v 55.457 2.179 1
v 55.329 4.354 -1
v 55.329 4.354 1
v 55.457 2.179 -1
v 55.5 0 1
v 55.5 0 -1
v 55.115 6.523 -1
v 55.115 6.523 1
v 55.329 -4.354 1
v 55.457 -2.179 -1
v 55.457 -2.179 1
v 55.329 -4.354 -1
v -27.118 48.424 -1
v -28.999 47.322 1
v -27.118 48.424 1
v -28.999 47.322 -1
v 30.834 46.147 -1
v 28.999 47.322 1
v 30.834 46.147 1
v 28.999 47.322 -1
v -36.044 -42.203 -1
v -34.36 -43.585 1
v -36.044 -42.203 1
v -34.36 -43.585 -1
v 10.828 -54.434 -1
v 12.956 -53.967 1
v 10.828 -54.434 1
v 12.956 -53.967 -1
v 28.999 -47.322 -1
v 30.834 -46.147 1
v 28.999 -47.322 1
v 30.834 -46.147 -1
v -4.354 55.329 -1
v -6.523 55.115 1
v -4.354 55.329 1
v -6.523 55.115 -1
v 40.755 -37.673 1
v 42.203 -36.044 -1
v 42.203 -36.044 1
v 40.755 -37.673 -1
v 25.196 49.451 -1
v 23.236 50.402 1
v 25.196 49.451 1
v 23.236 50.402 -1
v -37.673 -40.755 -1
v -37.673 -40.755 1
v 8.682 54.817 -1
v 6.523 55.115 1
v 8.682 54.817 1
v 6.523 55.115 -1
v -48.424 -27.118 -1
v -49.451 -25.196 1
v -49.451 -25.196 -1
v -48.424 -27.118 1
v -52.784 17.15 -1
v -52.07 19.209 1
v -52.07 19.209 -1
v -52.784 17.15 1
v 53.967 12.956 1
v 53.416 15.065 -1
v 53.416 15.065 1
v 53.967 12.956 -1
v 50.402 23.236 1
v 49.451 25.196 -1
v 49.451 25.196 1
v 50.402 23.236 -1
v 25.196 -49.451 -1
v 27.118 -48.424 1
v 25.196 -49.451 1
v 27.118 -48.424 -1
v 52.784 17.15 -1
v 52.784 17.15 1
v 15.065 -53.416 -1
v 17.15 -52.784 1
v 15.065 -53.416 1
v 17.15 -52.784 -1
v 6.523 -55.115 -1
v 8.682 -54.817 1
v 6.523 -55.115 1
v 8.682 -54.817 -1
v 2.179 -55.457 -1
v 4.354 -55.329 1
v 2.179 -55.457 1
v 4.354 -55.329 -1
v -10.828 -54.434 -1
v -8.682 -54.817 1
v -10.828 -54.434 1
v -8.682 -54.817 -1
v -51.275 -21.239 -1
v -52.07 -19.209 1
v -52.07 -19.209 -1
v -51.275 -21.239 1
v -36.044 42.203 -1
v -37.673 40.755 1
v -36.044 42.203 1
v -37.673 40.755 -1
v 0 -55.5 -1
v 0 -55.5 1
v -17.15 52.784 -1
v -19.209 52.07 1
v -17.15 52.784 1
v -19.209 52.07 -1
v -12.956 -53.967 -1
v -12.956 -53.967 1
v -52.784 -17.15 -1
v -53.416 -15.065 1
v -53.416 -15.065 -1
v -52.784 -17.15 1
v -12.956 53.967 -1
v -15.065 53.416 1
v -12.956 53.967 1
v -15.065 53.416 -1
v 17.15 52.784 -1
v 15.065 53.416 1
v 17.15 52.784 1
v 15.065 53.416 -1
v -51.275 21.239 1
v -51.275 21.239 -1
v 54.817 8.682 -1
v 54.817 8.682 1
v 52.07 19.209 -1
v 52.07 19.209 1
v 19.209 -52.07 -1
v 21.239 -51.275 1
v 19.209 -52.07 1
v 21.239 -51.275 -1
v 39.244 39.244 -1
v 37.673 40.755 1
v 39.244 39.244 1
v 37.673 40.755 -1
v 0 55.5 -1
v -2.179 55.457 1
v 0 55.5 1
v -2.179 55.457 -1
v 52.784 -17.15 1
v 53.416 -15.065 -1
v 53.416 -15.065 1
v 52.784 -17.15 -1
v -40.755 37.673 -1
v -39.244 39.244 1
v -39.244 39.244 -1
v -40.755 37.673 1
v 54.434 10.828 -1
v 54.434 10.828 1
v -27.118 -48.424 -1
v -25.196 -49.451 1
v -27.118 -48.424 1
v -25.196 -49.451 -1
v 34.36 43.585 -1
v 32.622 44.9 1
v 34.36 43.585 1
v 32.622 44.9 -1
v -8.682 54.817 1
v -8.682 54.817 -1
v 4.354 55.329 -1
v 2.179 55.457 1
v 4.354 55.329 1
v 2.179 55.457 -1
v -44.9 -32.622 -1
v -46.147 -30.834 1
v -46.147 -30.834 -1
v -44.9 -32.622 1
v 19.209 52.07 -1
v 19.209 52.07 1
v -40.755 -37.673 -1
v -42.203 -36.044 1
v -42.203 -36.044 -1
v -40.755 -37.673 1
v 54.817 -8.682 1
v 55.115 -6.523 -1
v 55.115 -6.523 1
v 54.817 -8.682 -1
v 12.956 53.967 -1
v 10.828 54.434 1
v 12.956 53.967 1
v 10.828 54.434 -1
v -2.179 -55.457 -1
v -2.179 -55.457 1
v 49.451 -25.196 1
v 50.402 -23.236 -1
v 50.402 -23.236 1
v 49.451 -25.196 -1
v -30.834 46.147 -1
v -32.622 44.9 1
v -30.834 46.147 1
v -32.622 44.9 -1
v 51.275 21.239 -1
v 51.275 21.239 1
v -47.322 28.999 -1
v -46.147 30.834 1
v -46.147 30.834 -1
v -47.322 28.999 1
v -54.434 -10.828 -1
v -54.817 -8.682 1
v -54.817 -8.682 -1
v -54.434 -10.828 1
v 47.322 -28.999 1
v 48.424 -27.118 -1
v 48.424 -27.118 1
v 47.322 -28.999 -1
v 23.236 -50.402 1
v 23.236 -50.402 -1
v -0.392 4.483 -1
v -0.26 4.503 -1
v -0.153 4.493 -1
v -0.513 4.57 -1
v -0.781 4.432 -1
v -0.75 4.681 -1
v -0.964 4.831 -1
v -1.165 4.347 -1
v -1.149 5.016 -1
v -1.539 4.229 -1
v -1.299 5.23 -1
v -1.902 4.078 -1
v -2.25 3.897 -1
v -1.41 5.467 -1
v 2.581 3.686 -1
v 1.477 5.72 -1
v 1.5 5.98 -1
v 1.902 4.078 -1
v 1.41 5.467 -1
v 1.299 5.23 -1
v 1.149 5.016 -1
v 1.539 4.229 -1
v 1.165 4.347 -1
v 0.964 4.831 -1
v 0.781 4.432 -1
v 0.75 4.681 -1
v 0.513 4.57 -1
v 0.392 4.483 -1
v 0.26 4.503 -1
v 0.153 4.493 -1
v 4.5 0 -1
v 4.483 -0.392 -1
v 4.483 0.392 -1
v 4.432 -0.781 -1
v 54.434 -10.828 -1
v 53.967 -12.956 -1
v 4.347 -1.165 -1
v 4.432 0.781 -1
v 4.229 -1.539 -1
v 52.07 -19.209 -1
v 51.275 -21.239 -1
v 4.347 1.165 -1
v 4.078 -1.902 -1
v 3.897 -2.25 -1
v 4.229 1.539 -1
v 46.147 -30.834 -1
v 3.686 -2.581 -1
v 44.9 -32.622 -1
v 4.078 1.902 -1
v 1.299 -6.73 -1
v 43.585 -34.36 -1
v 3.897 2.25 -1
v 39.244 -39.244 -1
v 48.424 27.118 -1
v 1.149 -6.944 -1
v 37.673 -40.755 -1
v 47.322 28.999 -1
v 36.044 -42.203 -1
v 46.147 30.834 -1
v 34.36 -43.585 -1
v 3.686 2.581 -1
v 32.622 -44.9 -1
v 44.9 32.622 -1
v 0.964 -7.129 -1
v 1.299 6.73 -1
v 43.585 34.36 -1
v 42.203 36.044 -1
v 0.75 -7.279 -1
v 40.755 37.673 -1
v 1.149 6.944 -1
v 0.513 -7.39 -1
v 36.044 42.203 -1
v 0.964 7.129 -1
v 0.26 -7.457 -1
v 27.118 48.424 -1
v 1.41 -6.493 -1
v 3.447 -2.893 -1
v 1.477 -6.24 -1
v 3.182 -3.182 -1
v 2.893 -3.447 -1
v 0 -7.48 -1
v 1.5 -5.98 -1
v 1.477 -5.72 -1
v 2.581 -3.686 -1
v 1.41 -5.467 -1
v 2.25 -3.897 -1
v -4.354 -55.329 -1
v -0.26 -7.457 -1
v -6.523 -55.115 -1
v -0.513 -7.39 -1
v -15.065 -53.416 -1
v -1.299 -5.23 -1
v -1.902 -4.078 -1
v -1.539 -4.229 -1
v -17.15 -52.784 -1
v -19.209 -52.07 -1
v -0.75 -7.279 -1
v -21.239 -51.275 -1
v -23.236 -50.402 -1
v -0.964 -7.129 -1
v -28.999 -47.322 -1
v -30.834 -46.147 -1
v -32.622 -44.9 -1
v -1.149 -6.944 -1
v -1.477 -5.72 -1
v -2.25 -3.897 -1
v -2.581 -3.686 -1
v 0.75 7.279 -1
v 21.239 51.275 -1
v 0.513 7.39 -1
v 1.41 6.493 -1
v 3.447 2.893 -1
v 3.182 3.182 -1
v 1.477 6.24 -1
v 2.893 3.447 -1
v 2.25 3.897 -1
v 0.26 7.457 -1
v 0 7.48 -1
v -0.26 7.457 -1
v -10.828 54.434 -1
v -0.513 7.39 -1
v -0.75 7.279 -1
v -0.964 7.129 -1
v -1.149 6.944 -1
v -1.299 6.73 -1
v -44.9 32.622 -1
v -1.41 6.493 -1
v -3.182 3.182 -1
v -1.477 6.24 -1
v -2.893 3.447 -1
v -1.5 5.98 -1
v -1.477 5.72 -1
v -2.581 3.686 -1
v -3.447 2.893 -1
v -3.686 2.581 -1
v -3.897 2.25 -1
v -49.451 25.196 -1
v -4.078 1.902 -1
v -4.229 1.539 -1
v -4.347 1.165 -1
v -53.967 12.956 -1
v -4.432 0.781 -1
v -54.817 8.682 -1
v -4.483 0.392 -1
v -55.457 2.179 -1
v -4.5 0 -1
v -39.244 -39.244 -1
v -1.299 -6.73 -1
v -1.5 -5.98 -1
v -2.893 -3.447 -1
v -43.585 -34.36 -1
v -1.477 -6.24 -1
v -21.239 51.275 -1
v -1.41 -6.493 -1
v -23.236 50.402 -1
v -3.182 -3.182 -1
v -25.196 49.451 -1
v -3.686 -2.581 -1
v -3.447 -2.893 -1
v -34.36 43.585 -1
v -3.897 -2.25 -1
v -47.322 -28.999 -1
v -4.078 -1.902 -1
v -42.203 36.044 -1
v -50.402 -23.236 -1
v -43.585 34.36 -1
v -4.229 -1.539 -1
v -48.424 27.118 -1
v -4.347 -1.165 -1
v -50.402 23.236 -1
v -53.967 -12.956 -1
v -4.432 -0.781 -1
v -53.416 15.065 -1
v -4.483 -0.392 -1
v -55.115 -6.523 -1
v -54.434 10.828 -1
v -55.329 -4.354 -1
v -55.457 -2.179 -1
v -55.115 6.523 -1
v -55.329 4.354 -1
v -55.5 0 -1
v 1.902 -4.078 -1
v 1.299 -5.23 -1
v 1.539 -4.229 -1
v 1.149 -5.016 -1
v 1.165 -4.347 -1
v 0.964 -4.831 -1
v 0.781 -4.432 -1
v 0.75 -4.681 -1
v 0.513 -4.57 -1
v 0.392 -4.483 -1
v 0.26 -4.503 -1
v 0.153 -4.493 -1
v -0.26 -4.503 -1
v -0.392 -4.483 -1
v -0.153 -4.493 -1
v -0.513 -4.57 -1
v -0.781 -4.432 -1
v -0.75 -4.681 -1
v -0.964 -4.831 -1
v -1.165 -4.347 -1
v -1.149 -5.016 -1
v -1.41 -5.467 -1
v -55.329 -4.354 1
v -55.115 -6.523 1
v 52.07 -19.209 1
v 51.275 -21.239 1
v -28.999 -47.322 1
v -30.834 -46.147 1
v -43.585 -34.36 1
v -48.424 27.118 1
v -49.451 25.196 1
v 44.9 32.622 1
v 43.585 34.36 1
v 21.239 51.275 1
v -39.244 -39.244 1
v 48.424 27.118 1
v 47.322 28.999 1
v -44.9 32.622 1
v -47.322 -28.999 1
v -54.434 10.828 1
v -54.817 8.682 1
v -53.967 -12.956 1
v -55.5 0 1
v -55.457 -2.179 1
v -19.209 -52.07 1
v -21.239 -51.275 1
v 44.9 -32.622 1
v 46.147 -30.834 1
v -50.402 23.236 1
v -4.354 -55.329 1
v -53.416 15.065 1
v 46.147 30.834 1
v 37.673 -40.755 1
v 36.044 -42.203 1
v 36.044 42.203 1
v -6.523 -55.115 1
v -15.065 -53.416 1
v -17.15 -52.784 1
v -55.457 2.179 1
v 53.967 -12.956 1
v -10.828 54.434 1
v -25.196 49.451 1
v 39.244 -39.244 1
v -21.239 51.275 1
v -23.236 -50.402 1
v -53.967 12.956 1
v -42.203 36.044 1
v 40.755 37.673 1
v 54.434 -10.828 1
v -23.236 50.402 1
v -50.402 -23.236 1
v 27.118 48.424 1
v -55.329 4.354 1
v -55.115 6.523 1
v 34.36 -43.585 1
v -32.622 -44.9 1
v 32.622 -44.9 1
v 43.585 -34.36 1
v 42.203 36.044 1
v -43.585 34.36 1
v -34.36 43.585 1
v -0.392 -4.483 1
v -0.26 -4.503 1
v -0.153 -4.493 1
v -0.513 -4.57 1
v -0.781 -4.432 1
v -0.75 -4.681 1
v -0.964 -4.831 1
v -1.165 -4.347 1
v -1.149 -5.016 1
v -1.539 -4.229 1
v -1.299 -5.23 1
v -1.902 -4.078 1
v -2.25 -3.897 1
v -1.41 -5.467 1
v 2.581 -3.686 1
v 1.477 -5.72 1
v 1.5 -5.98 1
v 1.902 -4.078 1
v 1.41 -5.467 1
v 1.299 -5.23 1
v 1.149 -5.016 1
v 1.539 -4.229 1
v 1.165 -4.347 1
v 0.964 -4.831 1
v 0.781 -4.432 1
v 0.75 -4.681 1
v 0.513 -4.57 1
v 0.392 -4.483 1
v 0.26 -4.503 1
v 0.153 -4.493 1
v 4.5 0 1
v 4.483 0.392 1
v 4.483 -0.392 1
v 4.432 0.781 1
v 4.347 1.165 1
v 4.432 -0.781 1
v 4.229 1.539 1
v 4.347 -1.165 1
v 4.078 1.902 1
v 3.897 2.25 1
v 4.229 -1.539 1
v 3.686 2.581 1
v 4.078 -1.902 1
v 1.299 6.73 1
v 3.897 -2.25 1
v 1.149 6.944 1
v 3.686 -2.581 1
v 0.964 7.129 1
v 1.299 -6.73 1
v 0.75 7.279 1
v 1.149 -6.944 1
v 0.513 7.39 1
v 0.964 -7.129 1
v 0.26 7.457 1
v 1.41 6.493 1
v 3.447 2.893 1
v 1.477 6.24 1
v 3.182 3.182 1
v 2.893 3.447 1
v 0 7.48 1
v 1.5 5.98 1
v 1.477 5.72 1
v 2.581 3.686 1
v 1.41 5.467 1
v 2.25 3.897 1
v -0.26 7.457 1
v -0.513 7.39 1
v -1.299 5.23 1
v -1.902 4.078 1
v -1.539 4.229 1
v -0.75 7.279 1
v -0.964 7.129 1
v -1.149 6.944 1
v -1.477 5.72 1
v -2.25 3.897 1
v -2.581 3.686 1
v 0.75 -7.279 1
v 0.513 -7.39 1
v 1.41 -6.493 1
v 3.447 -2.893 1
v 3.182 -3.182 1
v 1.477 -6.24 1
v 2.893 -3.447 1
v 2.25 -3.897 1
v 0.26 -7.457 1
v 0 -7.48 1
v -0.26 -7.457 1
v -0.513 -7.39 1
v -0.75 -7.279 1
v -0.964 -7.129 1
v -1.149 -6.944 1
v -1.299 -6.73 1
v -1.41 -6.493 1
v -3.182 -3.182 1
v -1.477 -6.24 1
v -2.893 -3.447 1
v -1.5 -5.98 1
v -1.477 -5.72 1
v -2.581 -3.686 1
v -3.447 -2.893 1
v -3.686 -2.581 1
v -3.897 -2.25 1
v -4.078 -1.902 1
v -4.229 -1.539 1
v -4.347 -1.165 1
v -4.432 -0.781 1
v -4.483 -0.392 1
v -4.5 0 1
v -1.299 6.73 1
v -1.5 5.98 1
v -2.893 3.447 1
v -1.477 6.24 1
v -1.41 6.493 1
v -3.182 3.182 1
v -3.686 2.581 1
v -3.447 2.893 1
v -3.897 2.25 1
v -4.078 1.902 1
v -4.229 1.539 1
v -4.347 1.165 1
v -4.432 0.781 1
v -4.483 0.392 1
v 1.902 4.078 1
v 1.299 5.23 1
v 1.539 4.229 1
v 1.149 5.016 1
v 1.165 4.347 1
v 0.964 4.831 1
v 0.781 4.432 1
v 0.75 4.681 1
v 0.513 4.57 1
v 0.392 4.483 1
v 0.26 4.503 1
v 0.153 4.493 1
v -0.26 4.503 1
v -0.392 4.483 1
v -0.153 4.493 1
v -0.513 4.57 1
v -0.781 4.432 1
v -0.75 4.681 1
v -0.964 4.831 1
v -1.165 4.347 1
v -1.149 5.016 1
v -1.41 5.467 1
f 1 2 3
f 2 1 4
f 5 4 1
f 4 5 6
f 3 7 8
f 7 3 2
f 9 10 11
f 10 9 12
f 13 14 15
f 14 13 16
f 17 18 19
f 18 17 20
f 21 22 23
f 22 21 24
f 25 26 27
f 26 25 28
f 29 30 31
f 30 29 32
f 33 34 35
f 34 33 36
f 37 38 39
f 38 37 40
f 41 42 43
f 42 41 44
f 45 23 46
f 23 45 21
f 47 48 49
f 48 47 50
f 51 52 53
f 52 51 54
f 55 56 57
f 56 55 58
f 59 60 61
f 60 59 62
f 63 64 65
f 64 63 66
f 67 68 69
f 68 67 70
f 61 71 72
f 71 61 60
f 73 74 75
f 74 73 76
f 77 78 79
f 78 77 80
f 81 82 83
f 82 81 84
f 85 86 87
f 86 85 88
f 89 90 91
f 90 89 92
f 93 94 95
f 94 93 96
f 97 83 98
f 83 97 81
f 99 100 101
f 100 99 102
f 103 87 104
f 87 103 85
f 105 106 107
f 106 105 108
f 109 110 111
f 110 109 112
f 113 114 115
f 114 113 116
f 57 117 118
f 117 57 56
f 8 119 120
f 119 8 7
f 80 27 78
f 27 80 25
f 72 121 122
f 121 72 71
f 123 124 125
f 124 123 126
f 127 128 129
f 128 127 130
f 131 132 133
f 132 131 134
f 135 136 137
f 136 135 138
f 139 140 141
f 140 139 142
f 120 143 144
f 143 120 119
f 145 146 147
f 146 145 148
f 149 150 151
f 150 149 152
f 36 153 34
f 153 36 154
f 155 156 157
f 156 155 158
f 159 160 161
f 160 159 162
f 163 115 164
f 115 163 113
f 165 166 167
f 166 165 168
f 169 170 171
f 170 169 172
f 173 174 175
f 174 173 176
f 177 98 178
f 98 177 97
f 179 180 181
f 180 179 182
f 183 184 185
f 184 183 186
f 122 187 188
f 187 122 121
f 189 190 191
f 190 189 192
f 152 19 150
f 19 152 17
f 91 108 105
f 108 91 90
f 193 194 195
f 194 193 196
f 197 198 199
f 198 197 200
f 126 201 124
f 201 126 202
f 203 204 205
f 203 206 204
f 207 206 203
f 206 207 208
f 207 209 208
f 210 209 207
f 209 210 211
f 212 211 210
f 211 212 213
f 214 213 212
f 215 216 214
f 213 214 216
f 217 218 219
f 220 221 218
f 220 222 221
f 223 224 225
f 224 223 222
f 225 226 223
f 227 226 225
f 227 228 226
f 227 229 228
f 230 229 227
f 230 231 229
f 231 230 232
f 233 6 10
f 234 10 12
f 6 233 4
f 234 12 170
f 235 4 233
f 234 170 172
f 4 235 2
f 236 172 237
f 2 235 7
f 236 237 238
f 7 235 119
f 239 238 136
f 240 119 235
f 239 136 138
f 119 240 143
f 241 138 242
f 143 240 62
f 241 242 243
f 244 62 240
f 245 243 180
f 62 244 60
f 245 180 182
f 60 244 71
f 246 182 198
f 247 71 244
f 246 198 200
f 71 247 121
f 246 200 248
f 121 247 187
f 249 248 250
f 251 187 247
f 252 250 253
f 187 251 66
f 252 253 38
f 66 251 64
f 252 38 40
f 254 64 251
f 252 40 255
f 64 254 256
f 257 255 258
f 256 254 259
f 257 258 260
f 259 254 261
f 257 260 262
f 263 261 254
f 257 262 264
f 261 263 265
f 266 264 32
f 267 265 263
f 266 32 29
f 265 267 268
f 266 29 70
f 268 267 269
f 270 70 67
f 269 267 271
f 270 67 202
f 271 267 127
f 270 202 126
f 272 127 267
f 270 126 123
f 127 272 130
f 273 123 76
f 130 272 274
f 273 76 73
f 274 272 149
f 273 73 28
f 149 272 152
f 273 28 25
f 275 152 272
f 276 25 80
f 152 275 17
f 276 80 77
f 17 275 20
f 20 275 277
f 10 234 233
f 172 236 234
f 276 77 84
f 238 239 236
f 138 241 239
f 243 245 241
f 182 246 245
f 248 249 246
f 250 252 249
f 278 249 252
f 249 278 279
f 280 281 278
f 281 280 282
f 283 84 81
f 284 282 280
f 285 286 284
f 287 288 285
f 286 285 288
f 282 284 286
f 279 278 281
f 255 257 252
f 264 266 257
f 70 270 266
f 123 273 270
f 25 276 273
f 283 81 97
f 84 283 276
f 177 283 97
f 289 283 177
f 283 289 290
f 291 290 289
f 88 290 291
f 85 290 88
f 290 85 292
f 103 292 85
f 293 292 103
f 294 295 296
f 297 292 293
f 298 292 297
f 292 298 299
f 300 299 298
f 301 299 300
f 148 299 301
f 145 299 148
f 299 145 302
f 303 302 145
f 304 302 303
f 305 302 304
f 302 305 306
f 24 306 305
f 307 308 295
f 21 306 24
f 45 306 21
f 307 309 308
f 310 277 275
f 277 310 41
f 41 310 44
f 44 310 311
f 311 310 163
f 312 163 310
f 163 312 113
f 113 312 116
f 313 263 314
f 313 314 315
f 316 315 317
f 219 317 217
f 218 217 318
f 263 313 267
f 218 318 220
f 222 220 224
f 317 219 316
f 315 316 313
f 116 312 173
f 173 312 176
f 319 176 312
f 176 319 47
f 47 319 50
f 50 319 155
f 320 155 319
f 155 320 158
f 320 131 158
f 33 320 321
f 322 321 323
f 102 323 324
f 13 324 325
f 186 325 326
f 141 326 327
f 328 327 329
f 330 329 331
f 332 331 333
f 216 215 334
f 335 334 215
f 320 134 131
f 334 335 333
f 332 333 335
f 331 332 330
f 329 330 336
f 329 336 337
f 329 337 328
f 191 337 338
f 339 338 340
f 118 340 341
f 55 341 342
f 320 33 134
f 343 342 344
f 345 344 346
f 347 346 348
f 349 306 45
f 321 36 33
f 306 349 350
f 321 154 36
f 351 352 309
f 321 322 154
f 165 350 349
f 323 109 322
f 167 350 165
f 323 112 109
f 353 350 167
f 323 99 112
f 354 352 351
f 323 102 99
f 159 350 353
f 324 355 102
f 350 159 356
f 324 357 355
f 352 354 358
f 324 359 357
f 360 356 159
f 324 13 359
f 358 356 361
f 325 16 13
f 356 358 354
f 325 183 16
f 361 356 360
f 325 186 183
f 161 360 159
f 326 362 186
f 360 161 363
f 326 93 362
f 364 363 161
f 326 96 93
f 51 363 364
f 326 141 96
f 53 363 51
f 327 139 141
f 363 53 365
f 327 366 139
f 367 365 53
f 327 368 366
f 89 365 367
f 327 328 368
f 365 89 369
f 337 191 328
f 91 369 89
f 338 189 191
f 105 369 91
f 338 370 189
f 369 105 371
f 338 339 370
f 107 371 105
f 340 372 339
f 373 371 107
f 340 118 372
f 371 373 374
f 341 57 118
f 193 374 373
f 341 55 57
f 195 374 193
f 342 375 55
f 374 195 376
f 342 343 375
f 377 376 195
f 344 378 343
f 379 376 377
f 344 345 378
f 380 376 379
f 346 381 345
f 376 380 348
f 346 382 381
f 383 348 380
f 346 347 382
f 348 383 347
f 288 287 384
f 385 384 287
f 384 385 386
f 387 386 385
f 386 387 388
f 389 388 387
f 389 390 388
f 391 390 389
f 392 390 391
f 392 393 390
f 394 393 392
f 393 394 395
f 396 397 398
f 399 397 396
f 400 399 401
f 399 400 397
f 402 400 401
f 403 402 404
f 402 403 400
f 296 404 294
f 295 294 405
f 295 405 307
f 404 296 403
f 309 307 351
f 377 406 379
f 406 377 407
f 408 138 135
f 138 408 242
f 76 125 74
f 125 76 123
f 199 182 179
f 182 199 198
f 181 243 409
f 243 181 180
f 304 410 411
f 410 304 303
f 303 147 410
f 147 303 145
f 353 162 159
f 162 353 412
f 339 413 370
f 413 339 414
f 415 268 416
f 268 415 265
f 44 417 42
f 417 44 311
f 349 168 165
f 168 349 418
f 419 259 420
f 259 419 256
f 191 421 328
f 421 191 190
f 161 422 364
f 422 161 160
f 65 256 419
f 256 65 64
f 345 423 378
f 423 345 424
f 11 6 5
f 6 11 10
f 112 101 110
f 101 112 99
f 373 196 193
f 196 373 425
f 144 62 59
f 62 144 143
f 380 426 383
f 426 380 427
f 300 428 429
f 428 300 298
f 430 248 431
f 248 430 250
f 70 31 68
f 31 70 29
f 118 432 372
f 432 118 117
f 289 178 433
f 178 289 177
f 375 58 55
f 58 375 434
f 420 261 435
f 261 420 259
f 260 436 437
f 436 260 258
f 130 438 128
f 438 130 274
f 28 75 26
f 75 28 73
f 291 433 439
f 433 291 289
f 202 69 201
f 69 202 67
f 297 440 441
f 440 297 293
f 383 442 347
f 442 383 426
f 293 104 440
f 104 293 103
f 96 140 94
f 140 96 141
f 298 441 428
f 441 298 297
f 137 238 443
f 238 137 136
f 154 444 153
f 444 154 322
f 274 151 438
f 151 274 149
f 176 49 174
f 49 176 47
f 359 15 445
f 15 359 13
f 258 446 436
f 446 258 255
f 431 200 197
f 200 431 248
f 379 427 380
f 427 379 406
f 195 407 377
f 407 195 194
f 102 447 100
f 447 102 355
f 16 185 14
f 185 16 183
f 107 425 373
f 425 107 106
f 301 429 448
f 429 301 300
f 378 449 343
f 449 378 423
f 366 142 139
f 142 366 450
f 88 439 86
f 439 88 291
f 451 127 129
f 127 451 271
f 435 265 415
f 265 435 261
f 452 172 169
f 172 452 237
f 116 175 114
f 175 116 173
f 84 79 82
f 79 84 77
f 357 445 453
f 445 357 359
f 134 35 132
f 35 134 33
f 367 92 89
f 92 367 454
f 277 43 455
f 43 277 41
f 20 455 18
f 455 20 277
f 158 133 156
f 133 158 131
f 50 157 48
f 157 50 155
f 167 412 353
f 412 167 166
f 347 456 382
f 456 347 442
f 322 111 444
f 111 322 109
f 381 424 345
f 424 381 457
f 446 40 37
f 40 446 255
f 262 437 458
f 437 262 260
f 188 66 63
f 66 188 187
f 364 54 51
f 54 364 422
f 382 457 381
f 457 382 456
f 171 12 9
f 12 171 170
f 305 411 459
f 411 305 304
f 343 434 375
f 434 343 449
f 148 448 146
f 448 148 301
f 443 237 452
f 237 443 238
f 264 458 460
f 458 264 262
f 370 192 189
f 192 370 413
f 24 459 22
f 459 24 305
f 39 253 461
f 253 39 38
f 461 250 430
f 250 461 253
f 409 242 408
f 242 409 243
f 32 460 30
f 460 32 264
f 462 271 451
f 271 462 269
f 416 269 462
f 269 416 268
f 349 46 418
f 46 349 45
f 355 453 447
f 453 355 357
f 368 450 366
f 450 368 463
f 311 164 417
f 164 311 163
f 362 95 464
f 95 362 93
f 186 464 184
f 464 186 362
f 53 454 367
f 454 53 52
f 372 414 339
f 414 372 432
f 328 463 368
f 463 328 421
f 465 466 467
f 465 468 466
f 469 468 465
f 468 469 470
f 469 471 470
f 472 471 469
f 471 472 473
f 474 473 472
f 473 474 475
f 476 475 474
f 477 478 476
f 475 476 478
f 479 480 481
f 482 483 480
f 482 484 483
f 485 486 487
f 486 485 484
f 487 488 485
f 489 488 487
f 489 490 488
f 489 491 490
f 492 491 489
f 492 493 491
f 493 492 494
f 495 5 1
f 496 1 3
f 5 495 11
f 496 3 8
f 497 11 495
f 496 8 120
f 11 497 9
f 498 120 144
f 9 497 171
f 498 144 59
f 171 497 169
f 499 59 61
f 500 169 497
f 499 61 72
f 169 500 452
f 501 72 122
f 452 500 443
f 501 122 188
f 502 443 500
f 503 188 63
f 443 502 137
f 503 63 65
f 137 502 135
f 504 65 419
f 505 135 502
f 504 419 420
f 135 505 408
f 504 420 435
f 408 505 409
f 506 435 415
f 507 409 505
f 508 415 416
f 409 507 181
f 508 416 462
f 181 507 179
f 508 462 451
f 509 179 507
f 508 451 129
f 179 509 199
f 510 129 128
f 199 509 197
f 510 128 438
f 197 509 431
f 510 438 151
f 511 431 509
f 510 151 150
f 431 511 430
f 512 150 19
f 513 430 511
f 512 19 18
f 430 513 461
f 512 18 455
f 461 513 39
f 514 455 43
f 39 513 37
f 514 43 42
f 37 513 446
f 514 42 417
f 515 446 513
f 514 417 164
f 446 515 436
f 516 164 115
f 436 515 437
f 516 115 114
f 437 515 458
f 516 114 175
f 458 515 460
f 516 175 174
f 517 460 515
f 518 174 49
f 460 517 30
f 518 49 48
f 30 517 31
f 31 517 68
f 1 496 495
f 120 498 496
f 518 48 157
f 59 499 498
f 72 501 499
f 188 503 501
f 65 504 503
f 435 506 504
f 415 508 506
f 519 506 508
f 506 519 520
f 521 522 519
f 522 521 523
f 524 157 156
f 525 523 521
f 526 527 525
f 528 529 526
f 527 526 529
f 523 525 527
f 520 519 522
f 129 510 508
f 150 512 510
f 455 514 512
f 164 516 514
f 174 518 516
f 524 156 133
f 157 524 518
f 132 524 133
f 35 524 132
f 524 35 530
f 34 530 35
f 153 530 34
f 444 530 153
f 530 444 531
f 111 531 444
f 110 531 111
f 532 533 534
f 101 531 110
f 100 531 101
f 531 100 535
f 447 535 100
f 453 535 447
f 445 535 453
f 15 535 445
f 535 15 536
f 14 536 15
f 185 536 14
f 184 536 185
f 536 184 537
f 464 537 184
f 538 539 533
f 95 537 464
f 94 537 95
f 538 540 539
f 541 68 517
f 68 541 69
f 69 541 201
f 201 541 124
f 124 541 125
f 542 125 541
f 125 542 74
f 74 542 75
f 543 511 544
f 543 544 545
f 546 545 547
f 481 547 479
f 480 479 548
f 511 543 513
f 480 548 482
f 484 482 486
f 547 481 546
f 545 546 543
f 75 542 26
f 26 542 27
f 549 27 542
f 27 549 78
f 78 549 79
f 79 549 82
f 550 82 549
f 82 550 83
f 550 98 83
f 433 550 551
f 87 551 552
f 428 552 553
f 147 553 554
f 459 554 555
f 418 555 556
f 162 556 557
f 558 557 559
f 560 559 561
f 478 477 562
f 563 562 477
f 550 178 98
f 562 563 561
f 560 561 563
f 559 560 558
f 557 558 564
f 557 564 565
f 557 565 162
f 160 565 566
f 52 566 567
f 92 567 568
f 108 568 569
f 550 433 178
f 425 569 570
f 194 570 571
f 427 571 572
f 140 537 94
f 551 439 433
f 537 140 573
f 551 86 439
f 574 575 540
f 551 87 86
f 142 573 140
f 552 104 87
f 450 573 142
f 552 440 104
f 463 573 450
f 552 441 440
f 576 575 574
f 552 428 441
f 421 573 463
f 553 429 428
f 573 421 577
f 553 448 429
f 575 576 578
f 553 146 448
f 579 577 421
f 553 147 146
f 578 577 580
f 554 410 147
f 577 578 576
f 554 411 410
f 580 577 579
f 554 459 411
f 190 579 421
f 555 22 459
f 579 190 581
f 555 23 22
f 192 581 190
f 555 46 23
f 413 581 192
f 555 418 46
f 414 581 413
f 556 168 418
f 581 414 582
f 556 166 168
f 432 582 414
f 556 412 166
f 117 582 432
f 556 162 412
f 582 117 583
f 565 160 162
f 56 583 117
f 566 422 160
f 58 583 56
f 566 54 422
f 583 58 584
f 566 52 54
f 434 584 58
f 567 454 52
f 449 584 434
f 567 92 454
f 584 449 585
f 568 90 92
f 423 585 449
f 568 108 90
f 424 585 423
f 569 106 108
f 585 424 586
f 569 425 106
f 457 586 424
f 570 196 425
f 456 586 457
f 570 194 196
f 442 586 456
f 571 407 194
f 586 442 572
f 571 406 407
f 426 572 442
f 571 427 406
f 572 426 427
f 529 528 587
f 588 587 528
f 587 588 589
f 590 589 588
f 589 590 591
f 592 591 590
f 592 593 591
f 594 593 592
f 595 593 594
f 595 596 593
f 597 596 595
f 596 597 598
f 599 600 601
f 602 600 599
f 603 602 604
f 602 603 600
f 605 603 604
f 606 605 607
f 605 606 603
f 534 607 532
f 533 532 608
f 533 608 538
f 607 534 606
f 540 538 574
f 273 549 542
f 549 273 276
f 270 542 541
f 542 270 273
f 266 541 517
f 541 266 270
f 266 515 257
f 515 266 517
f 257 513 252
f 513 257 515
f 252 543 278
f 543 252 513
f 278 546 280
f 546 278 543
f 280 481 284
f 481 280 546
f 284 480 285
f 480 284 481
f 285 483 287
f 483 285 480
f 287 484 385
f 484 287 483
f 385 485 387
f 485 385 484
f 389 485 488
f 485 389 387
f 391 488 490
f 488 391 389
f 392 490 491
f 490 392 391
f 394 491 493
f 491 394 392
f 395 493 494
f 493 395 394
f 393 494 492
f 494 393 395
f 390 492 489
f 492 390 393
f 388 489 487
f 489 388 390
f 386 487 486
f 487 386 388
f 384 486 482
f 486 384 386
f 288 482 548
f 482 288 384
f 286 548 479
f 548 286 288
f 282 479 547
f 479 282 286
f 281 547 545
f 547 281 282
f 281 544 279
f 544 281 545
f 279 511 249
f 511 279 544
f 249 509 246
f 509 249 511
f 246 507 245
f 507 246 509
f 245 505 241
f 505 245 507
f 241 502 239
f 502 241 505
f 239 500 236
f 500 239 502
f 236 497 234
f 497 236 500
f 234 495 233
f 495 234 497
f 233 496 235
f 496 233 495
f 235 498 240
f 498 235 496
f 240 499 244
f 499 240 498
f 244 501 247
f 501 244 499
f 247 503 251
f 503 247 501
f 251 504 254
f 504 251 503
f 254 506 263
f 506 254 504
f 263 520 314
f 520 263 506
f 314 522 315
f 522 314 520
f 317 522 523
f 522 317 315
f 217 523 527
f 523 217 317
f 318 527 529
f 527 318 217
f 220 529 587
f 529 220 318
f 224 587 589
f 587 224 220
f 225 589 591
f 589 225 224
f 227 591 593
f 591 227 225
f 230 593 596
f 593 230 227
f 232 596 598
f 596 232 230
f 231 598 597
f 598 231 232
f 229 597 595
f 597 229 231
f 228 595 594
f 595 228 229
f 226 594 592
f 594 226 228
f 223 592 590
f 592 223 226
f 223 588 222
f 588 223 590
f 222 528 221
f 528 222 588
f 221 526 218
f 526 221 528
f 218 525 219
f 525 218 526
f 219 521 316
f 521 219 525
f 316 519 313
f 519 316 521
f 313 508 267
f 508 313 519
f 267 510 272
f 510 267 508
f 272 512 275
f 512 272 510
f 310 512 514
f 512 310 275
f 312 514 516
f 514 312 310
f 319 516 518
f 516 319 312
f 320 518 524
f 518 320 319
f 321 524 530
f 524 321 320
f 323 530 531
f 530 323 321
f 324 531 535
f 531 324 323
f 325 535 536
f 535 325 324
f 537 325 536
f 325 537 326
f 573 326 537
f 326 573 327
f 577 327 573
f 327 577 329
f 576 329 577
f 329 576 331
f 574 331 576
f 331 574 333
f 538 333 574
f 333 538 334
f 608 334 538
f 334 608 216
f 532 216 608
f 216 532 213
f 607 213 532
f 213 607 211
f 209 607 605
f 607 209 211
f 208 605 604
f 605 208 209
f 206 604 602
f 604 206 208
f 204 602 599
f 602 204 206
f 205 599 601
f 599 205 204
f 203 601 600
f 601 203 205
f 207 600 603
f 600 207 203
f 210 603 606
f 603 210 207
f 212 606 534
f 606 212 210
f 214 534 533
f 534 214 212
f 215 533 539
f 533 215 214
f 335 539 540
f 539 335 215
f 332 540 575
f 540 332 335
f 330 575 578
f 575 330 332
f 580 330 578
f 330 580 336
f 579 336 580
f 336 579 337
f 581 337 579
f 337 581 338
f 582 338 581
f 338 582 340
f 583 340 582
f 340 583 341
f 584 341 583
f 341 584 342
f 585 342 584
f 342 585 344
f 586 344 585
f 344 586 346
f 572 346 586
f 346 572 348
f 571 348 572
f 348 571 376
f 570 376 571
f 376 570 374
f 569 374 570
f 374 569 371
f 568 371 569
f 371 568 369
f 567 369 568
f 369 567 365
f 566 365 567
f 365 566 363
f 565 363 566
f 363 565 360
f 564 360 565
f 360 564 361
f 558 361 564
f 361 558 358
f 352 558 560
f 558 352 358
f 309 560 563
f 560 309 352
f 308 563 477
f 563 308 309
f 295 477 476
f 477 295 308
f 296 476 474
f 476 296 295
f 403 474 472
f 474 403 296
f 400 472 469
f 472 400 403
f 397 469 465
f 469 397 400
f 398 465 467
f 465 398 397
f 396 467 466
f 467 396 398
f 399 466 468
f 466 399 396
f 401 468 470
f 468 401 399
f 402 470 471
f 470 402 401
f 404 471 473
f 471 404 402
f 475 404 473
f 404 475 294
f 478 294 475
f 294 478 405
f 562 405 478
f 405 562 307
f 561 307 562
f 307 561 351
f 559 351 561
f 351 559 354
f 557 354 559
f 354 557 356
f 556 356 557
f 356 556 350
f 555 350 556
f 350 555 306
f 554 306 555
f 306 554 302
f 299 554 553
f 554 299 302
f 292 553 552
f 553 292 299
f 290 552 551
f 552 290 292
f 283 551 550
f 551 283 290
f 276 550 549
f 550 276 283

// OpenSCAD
// Part A10: disc with keyed center cutout.
// SPDX-License-Identifier: MIT

module a10_center_profile_2d(center_hole_d = 9.0, detent_r = 1.5) {
    // Center cutout profile from drawing:
    // Ø9.0 with two offset R1.5 circles.
    union() {
        circle(d = center_hole_d, $fn = 72);
        // Slight overlap avoids zero-thickness point contact at exact tangency.
        detent_offset = center_hole_d / 2 + detent_r - 0.02;
        translate([0,  detent_offset]) circle(r = detent_r, $fn = 36);
        translate([0, -detent_offset]) circle(r = detent_r, $fn = 36);
    }
}

module part_a10(od = 111, th = 2, center_hole_d = 9, center_detent_r = 1.5) {
    difference() {
        cylinder(d = od, h = th, center = true, $fn = 160);
        translate([0, 0, -th / 2 - 0.1])
            linear_extrude(height = th + 0.2)
                a10_center_profile_2d(center_hole_d = center_hole_d, detent_r = center_detent_r);
    }
}


// ---- "main guard" ----
// Default to previewing when opened directly:
if (is_undef(__LIB_MODE__)) {
    part_a10();
}
